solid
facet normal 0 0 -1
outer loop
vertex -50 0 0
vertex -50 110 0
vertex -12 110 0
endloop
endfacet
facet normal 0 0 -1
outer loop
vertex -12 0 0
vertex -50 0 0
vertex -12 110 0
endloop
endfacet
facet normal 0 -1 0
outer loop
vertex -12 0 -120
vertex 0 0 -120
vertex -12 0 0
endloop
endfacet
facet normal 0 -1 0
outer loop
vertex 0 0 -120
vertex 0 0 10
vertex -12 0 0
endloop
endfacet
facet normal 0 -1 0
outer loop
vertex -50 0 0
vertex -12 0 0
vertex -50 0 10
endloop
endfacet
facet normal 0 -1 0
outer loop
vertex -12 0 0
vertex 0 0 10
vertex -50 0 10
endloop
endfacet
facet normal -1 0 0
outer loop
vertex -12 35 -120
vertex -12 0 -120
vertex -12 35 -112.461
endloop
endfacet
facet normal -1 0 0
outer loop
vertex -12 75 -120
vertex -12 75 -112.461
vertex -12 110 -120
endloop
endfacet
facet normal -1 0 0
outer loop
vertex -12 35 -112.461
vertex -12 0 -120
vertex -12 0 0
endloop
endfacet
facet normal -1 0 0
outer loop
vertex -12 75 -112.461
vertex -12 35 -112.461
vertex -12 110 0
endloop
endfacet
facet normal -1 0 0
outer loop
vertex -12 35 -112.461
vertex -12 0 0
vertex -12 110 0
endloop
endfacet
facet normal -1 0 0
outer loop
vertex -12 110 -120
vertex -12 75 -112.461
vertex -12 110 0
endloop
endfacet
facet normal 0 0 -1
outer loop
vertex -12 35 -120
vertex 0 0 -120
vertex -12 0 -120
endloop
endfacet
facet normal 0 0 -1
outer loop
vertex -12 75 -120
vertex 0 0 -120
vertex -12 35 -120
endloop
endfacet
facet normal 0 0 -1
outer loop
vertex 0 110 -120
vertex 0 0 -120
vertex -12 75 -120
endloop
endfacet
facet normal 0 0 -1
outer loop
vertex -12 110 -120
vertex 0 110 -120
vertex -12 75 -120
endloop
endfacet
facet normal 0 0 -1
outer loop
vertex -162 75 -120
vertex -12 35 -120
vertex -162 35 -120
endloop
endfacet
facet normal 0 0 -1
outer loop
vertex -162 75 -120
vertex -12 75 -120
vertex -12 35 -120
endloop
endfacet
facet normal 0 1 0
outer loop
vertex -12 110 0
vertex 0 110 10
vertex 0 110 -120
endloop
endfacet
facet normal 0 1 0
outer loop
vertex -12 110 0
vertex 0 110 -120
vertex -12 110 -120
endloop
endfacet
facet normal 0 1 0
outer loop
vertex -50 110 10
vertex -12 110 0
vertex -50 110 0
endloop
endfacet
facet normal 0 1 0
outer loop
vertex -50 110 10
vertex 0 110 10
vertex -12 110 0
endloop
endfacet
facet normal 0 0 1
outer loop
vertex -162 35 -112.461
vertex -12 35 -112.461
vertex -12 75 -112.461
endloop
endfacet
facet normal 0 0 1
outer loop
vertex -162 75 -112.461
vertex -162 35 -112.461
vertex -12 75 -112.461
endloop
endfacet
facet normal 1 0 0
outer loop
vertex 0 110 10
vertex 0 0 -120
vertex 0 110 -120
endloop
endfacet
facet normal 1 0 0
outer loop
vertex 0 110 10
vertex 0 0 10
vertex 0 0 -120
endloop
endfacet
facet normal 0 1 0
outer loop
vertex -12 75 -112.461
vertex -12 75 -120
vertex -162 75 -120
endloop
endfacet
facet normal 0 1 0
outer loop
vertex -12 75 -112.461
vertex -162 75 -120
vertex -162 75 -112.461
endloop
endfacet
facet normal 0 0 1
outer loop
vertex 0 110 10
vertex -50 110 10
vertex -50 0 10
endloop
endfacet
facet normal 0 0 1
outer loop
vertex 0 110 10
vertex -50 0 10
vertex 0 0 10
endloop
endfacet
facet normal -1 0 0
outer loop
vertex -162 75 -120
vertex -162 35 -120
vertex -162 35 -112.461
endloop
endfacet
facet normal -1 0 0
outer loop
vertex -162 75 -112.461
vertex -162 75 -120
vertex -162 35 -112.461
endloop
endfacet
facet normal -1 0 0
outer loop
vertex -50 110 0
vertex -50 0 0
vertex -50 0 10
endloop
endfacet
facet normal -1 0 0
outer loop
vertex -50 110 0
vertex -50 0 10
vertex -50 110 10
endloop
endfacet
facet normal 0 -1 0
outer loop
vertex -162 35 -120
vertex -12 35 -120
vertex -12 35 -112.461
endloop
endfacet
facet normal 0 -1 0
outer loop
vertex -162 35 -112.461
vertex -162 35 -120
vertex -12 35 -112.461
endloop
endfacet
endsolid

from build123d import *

# Parameters (mm, degrees)
SKETCH1_W           = 50
SKETCH1_H           = 110
BOSS_EXTRUDE1_DEPTH = 10
SKETCH2_W           = 12
SKETCH2_H           = 110
BOSS_EXTRUDE2_DEPTH = 120
SKETCH3_W           = 7.539466006
SKETCH3_H           = 40
BOSS_EXTRUDE3_DEPTH = 150


with BuildPart() as part:
    # Sketch1 → Boss-Extrude1 (new body)
    with BuildSketch(Plane.XY):
        with Locations((-25, 55)):
            Rectangle(SKETCH1_W, SKETCH1_H)
    extrude(amount=BOSS_EXTRUDE1_DEPTH)

    # Sketch2 → Boss-Extrude2 (add)
    with BuildSketch(Plane(origin=(0, 0, 0), x_dir=(-1, 0, 0), z_dir=(0, 0, -1))):
        with Locations((6, 55)):
            Rectangle(SKETCH2_W, SKETCH2_H)
    extrude(amount=BOSS_EXTRUDE2_DEPTH)

    # Sketch3 → Boss-Extrude3 (add)
    with BuildSketch(Plane.ZY.offset(12)):
        with Locations((-116.230266997, 55)):
            Rectangle(SKETCH3_W, SKETCH3_H)
    extrude(amount=BOSS_EXTRUDE3_DEPTH)


solid = part.part
